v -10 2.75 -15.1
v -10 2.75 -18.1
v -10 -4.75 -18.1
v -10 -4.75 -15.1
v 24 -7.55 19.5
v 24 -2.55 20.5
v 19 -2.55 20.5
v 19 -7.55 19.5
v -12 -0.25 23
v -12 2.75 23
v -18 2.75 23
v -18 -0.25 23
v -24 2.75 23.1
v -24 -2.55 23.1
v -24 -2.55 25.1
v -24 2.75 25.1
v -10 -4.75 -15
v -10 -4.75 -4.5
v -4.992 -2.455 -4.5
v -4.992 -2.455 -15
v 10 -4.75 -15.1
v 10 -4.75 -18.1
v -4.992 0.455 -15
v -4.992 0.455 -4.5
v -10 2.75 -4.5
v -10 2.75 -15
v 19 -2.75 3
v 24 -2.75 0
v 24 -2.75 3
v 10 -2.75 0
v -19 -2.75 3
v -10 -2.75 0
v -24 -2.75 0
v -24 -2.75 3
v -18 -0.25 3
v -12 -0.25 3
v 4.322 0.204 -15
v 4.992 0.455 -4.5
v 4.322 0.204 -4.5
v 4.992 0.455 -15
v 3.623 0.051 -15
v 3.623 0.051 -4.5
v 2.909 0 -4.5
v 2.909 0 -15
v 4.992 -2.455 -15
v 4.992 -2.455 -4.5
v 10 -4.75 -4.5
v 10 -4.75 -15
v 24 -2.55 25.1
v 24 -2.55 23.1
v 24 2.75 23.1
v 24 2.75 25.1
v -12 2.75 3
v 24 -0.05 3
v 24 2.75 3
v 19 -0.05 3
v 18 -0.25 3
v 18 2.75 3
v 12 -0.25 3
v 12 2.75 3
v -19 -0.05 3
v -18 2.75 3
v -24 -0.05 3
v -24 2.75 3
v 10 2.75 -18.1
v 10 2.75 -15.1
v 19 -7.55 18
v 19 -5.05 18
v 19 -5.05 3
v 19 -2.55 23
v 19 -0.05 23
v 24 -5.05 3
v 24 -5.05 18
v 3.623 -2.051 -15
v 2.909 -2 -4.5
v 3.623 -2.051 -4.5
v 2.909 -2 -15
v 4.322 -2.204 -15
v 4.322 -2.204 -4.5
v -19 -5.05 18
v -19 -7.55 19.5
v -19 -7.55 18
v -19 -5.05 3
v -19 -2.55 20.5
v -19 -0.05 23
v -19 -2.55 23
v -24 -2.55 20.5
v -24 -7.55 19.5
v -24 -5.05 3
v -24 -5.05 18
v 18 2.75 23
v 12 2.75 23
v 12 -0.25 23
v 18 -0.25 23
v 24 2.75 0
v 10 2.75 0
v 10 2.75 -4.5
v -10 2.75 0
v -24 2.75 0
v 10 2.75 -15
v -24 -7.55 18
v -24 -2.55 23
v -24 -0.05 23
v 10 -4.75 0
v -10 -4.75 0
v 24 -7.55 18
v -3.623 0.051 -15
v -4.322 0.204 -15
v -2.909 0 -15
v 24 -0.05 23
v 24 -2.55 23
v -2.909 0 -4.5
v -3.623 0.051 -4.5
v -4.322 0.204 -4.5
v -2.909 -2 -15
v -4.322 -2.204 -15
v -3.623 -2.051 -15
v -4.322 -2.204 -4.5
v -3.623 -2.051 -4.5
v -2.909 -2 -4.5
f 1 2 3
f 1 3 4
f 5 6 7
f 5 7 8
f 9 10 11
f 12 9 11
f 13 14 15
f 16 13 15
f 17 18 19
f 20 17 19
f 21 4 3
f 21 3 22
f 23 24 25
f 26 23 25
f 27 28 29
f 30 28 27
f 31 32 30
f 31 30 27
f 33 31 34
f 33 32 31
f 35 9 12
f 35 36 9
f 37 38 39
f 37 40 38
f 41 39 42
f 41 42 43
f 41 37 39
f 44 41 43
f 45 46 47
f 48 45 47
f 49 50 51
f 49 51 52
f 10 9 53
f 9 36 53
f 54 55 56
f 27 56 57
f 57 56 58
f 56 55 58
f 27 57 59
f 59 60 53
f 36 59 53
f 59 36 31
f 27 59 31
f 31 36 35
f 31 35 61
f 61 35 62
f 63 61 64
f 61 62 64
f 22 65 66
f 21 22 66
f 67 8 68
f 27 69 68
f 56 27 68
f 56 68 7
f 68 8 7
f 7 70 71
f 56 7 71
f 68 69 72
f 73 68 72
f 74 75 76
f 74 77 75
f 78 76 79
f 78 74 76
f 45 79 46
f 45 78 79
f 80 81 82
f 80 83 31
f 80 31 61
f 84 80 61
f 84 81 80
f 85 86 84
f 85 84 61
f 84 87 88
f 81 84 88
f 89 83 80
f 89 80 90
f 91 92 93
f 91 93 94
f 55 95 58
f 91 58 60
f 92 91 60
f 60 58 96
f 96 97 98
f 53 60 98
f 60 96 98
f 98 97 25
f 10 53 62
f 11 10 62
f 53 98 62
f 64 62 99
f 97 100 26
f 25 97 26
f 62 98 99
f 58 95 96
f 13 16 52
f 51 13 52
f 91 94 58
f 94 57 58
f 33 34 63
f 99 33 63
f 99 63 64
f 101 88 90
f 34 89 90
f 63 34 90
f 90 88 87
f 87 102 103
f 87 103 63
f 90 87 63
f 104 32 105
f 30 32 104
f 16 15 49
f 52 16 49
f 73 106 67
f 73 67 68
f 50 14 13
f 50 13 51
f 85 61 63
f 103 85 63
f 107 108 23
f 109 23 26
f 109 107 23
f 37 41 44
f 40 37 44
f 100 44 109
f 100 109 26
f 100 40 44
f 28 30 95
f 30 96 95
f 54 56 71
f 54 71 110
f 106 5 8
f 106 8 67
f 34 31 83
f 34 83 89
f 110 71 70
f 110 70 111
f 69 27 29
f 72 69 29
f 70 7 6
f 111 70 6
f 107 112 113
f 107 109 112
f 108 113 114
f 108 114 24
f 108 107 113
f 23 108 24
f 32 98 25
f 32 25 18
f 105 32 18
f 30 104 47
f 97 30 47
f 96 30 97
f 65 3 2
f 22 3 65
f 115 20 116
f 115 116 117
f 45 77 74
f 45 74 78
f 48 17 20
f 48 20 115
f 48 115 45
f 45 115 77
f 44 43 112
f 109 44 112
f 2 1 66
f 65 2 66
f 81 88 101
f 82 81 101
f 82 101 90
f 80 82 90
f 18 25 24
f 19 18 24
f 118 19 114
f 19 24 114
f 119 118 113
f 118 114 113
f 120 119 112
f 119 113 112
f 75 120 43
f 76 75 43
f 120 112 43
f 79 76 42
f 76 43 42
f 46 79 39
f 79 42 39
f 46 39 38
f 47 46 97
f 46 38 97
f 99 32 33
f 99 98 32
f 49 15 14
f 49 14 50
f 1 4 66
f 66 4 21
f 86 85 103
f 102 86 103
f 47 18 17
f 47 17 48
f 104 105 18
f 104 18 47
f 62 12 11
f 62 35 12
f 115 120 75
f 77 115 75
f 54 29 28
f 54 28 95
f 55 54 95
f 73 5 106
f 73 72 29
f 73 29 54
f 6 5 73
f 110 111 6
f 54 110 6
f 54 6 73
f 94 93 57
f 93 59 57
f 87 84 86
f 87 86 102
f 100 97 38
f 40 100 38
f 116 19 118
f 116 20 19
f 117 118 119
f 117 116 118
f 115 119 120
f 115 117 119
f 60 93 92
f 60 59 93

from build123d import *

# Parameters (mm, degrees)
F0_W      = 14
F0_H      = 5.5
F1_DEPTH  = 3
F0_W_2    = 10
F0_H_2    = 2
F2_DEPTH  = 4.5
F4_DEPTH  = 10.5
F5_W      = 6
F5_H      = 3
F5_W_2    = 5
F5_H_2    = 2.7
F5_H_3    = 2.3
F6_DEPTH  = 15
F6_FACE_W = 6
F6_FACE_H = 3
F7_W      = 5
F7_H      = 2.5
F8_DEPTH  = 5
F10_DEPTH = 5
F12_R     = 5
F13_W     = 20
F13_H     = 3
F14_DEPTH = 7.5
F15_W     = 48
F15_H     = 2
F16_DEPTH = 5.3


# Not quite as in the source:
# - a feature names something its author has since deleted; it is built from what else it names


with BuildPart() as f1:
    # F0 (on Top) → F1 (new body)
    with BuildSketch(Plane.XY):
        with Locations((17, 0)):
            Rectangle(F0_W, F0_H)
        Polygon((0, -2.75), (10, -2.75), (10, 2.75), (-10, 2.75), (-10, -2.75), align=None)
    extrude(amount=F1_DEPTH)

    # F0 (on Top) → F2 (join)
    with BuildSketch(Plane.XY):
        Polygon((0, -2.75), (10, -2.75), (10, 2.75), (-10, 2.75), (-10, -2.75), align=None)
        with Locations((-5, -3.75)):
            Rectangle(F0_W_2, F0_H_2)
        with Locations((5, -3.75)):
            Rectangle(F0_W_2, F0_H_2)
    extrude(amount=-F2_DEPTH)

    # F3 (on face) → F4 (join)
    with BuildSketch(Plane(origin=(0, 0, -4.5), x_dir=(1, 0, 0), z_dir=(0, 0, -1))):
        Polygon((0, -2.75), (10, -2.75), (4, 0), (0, 0), align=None)
        Polygon((-10, -2.75), (0, -2.75), (0, 0), (-4, 0), align=None)
        Polygon((4, 2), (10, 4.75), (0, 4.75), (0, 2), align=None)
        Polygon((-4, 2), (0, 2), (0, 4.75), (-10, 4.75), align=None)
    extrude(amount=F4_DEPTH)

    # F5 (on face) → F6 (join)
    with BuildSketch(Plane.XY.offset(3)):
        with Locations((15, 1.25)):
            Rectangle(F5_W, F5_H)
        with Locations((21.5, -1.4)):
            Rectangle(F5_W_2, F5_H_2)
        with Locations((21.5, -3.9)):
            Rectangle(F5_W_2, F5_H_3)
    extrude(amount=F6_DEPTH)

    # F6_face (on face) + F7 (on face) → F8 (join)
    with BuildSketch(Plane(origin=(21.5, -2.55, 18), x_dir=(1, 0, 0), z_dir=(0, 0, 1))):
        with Locations((-6.5, 3.8)):
            Rectangle(F6_FACE_W, F6_FACE_H)
    with BuildSketch(Plane.XY.offset(18)):
        with Locations((21.5, -1.3)):
            Rectangle(F7_W, F7_H)
    extrude(amount=F8_DEPTH)

    # F9 (on face) → F10 (join)
    with BuildSketch(Plane.YZ.offset(24)):
        Polygon((-5.05, 18), (-2.55, 18), (-2.55, 19.5), (-7.55, 19.5), (-7.55, 18), align=None)
        Polygon((-7.55, 19.5), (-2.55, 19.5), (-2.55, 20.5), align=None)
    extrude(amount=-F10_DEPTH)

    # F11: F1 across plane


with BuildPart() as f1_1:
    add(f1.part)
    add(f1.part.mirror(Plane.YZ))

    # F12
    f12_edges = [f1_1.edges().sort_by_distance(p)[0] for p in [
        (-4, -2, -9.75),
        (4, -2, -9.75),
        (4, 0, -9.75),
        (-4, 0, -9.75),
    ]]
    fillet(f12_edges, radius=F12_R)


with BuildPart() as f14:
    # F13 (on face) → F14 (new body)
    with BuildSketch(Plane.XZ.offset(4.75)):
        with Locations((0, -16.6)):
            Rectangle(F13_W, F13_H)
    extrude(amount=-F14_DEPTH)


with BuildPart() as f16:
    # F15 (on face) → F16 (new body)
    with BuildSketch(Plane.XZ.offset(2.55)):
        with Locations((0, 24.1)):
            Rectangle(F15_W, F15_H)
    extrude(amount=-F16_DEPTH)


solid = Compound([f1_1.part, f14.part, f16.part])
